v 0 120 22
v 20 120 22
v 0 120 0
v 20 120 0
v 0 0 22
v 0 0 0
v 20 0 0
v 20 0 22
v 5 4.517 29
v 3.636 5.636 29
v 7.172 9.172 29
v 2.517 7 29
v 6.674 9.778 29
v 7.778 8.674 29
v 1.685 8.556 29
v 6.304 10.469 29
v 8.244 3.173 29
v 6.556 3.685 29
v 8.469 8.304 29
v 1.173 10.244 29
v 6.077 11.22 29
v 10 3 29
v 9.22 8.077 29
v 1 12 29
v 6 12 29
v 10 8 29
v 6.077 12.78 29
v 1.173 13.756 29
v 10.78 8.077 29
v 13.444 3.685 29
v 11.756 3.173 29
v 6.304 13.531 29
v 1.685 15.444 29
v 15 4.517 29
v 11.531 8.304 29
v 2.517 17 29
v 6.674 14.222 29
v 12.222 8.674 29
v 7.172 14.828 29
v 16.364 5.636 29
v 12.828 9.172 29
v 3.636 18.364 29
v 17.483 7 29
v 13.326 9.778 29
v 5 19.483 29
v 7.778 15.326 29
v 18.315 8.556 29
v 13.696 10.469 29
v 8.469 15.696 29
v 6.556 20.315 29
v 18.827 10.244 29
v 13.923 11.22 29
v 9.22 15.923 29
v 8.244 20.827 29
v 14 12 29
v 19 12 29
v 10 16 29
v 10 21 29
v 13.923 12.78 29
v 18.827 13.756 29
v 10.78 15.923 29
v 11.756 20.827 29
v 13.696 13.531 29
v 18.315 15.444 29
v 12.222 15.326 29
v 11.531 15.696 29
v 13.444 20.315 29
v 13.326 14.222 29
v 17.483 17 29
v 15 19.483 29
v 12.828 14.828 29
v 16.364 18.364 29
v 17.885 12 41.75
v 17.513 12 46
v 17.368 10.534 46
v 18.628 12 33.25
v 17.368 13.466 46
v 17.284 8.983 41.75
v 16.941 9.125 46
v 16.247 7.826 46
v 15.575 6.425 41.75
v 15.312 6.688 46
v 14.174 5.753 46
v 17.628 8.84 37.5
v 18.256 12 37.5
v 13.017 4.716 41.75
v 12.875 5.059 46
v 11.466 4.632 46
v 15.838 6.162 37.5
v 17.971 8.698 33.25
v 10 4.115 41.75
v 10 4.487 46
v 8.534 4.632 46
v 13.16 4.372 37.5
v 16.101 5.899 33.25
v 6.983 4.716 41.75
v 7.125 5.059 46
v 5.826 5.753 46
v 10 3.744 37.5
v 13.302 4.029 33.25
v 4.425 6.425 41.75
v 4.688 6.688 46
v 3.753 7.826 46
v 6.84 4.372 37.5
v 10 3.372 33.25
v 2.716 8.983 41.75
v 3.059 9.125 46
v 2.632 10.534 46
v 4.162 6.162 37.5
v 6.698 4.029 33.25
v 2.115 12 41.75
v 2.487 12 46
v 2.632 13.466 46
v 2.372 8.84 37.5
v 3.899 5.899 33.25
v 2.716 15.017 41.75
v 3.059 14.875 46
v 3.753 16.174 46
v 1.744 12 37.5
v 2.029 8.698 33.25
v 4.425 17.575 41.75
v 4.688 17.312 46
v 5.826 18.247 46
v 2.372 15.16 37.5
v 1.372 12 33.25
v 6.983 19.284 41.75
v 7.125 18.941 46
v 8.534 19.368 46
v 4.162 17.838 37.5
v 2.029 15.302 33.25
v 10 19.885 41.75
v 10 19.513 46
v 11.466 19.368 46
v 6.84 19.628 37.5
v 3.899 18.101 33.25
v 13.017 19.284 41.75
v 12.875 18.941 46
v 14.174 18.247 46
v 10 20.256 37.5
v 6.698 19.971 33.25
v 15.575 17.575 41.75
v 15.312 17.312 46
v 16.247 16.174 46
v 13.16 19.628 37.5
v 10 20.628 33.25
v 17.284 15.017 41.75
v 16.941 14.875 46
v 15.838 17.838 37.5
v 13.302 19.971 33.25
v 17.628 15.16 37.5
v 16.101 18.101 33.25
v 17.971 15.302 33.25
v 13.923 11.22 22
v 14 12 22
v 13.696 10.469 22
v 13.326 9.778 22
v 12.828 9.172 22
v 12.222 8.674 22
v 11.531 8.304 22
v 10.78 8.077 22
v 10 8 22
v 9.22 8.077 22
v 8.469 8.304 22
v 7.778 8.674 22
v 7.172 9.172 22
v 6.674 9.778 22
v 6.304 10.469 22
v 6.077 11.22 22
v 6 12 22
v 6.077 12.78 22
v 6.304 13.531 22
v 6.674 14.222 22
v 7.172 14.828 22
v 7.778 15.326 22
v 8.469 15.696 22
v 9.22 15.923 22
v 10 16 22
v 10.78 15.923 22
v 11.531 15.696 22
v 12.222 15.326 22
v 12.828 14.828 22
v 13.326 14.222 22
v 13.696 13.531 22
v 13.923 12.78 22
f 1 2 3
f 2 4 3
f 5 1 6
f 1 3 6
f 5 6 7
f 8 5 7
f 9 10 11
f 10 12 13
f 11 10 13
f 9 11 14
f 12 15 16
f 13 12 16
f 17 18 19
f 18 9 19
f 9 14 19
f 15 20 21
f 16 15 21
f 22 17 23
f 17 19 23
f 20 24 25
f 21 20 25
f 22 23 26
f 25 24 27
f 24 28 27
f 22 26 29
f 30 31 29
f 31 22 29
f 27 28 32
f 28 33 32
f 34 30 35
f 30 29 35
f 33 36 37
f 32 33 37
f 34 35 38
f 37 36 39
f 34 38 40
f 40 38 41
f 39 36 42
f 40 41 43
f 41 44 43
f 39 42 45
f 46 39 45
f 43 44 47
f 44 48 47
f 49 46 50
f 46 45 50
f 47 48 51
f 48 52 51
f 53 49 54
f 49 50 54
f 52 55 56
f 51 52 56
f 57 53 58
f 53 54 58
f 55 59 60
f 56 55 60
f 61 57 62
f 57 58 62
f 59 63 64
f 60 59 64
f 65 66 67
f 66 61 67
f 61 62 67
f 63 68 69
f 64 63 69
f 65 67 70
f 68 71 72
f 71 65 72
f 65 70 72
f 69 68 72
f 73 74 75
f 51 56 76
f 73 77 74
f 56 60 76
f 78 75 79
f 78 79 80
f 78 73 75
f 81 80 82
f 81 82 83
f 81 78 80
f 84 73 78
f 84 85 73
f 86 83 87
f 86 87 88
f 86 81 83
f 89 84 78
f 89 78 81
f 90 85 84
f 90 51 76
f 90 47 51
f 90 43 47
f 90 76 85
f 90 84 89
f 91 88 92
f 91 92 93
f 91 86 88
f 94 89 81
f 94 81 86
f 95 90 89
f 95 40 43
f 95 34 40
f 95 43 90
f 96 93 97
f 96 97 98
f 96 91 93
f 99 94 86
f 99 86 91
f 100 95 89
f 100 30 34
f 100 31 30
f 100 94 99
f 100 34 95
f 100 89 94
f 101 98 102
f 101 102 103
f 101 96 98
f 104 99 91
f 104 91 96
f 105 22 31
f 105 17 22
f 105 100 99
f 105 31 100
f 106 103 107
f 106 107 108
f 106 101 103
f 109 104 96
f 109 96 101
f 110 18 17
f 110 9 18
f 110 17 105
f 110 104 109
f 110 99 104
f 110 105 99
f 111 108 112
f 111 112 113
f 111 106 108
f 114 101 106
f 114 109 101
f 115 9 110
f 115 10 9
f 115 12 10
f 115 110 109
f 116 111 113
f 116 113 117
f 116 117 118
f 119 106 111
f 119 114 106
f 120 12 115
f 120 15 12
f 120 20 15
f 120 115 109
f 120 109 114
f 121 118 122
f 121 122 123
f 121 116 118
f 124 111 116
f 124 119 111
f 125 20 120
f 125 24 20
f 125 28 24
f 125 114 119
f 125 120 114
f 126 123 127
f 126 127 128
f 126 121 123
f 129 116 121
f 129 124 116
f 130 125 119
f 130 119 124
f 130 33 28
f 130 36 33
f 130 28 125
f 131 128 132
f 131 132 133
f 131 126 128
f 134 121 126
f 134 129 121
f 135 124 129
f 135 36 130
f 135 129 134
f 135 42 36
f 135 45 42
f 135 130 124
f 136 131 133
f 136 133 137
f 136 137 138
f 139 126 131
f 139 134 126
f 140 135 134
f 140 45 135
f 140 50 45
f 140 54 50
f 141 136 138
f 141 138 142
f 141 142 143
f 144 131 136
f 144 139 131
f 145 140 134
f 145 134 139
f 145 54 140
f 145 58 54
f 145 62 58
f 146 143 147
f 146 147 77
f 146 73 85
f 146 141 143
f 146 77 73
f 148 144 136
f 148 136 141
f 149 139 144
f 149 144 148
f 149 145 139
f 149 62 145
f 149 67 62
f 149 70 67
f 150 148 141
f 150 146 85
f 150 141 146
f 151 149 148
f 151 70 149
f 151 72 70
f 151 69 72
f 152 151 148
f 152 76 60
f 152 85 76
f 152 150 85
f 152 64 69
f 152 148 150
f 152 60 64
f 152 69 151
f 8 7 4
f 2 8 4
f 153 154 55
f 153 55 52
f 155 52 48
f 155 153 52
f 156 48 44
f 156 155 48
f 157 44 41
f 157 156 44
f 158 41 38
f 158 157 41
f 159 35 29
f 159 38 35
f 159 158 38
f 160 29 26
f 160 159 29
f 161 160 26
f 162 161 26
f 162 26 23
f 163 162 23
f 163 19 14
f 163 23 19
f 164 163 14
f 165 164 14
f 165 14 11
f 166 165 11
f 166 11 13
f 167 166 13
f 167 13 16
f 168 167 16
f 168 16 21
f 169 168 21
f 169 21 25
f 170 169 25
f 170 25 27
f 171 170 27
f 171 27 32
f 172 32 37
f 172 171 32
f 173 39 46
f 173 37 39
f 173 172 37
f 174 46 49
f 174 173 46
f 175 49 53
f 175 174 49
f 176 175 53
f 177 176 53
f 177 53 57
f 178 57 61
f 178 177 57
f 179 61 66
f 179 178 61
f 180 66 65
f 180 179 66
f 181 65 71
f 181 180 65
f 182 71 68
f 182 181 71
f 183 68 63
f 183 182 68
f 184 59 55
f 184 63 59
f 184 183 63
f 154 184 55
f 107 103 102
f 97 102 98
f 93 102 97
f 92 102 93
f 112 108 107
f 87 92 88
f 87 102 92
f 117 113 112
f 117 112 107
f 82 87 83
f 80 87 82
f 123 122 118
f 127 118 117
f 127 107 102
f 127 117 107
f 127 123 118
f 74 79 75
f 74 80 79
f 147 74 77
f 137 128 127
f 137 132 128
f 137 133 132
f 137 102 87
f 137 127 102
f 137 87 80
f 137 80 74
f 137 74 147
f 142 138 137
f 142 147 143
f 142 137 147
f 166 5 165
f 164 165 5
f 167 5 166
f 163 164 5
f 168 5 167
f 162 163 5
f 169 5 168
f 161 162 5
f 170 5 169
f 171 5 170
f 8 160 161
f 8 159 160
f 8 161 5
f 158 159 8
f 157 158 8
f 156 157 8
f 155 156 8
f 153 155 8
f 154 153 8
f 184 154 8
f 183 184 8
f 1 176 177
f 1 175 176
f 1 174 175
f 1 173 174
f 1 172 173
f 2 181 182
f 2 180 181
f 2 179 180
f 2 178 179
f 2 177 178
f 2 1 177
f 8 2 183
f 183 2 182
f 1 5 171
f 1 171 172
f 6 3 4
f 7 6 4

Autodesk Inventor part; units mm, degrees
ref_plane "YZ Plane" through (0, 0, 0) normal (1, 0, 0) x (0, 1, 0)
ref_plane "XZ Plane" through (0, 0, 0) normal (0, 1, 0) x (-1, 0, 0)
ref_plane "XY Plane" through (0, 0, 0) normal (0, 0, 1) x (1, 0, 0)
sketch "Sketch1" plane through (0, 0, 0) normal (0, 0, 1) x (1, 0, 0)
  line L0 (0, 0) -> (20, 0)
  line L1 (20, 0) -> (20, 120)
  line L2 (20, 120) -> (0, 120)
  line L3 (0, 120) -> (0, 0)
  dimension "d0" = 120
  dimension "d1" = 20
extrude "Extrusion1" add sketch "Sketch1" along normal blind 22
sketch "Sketch2" plane through (0, 0, 22) normal (0, 0, 1) x (1, 0, 0)
  point P0 (0, 0)
sketch "Sketch3" plane through (0, 0, 22) normal (0, 0, 1) x (1, 0, 0)
  circle A0 centre (10, 12) radius 4
  line L0 (0, 0) -> (20, 0) construction
  line L1 (10, 12) -> (10, 0) construction
  dimension "d4" = 12
  dimension "d5" = 8
extrude "Extrusion2" add sketch "Sketch3" along normal blind 7
sketch "Sketch4" plane through (10, 12, 29) normal (0, 0, 1) x (1, 0, 0)
  circle A0 centre (0, 0) radius 4 construction
  circle A1 centre (0, 0) radius 9
  point P0 (-10, -12)
  dimension "d8" = 18
extrude "Extrusion3" add sketch "Sketch4" along normal blind 17 draft -5
properties part number "FlowMeter"
